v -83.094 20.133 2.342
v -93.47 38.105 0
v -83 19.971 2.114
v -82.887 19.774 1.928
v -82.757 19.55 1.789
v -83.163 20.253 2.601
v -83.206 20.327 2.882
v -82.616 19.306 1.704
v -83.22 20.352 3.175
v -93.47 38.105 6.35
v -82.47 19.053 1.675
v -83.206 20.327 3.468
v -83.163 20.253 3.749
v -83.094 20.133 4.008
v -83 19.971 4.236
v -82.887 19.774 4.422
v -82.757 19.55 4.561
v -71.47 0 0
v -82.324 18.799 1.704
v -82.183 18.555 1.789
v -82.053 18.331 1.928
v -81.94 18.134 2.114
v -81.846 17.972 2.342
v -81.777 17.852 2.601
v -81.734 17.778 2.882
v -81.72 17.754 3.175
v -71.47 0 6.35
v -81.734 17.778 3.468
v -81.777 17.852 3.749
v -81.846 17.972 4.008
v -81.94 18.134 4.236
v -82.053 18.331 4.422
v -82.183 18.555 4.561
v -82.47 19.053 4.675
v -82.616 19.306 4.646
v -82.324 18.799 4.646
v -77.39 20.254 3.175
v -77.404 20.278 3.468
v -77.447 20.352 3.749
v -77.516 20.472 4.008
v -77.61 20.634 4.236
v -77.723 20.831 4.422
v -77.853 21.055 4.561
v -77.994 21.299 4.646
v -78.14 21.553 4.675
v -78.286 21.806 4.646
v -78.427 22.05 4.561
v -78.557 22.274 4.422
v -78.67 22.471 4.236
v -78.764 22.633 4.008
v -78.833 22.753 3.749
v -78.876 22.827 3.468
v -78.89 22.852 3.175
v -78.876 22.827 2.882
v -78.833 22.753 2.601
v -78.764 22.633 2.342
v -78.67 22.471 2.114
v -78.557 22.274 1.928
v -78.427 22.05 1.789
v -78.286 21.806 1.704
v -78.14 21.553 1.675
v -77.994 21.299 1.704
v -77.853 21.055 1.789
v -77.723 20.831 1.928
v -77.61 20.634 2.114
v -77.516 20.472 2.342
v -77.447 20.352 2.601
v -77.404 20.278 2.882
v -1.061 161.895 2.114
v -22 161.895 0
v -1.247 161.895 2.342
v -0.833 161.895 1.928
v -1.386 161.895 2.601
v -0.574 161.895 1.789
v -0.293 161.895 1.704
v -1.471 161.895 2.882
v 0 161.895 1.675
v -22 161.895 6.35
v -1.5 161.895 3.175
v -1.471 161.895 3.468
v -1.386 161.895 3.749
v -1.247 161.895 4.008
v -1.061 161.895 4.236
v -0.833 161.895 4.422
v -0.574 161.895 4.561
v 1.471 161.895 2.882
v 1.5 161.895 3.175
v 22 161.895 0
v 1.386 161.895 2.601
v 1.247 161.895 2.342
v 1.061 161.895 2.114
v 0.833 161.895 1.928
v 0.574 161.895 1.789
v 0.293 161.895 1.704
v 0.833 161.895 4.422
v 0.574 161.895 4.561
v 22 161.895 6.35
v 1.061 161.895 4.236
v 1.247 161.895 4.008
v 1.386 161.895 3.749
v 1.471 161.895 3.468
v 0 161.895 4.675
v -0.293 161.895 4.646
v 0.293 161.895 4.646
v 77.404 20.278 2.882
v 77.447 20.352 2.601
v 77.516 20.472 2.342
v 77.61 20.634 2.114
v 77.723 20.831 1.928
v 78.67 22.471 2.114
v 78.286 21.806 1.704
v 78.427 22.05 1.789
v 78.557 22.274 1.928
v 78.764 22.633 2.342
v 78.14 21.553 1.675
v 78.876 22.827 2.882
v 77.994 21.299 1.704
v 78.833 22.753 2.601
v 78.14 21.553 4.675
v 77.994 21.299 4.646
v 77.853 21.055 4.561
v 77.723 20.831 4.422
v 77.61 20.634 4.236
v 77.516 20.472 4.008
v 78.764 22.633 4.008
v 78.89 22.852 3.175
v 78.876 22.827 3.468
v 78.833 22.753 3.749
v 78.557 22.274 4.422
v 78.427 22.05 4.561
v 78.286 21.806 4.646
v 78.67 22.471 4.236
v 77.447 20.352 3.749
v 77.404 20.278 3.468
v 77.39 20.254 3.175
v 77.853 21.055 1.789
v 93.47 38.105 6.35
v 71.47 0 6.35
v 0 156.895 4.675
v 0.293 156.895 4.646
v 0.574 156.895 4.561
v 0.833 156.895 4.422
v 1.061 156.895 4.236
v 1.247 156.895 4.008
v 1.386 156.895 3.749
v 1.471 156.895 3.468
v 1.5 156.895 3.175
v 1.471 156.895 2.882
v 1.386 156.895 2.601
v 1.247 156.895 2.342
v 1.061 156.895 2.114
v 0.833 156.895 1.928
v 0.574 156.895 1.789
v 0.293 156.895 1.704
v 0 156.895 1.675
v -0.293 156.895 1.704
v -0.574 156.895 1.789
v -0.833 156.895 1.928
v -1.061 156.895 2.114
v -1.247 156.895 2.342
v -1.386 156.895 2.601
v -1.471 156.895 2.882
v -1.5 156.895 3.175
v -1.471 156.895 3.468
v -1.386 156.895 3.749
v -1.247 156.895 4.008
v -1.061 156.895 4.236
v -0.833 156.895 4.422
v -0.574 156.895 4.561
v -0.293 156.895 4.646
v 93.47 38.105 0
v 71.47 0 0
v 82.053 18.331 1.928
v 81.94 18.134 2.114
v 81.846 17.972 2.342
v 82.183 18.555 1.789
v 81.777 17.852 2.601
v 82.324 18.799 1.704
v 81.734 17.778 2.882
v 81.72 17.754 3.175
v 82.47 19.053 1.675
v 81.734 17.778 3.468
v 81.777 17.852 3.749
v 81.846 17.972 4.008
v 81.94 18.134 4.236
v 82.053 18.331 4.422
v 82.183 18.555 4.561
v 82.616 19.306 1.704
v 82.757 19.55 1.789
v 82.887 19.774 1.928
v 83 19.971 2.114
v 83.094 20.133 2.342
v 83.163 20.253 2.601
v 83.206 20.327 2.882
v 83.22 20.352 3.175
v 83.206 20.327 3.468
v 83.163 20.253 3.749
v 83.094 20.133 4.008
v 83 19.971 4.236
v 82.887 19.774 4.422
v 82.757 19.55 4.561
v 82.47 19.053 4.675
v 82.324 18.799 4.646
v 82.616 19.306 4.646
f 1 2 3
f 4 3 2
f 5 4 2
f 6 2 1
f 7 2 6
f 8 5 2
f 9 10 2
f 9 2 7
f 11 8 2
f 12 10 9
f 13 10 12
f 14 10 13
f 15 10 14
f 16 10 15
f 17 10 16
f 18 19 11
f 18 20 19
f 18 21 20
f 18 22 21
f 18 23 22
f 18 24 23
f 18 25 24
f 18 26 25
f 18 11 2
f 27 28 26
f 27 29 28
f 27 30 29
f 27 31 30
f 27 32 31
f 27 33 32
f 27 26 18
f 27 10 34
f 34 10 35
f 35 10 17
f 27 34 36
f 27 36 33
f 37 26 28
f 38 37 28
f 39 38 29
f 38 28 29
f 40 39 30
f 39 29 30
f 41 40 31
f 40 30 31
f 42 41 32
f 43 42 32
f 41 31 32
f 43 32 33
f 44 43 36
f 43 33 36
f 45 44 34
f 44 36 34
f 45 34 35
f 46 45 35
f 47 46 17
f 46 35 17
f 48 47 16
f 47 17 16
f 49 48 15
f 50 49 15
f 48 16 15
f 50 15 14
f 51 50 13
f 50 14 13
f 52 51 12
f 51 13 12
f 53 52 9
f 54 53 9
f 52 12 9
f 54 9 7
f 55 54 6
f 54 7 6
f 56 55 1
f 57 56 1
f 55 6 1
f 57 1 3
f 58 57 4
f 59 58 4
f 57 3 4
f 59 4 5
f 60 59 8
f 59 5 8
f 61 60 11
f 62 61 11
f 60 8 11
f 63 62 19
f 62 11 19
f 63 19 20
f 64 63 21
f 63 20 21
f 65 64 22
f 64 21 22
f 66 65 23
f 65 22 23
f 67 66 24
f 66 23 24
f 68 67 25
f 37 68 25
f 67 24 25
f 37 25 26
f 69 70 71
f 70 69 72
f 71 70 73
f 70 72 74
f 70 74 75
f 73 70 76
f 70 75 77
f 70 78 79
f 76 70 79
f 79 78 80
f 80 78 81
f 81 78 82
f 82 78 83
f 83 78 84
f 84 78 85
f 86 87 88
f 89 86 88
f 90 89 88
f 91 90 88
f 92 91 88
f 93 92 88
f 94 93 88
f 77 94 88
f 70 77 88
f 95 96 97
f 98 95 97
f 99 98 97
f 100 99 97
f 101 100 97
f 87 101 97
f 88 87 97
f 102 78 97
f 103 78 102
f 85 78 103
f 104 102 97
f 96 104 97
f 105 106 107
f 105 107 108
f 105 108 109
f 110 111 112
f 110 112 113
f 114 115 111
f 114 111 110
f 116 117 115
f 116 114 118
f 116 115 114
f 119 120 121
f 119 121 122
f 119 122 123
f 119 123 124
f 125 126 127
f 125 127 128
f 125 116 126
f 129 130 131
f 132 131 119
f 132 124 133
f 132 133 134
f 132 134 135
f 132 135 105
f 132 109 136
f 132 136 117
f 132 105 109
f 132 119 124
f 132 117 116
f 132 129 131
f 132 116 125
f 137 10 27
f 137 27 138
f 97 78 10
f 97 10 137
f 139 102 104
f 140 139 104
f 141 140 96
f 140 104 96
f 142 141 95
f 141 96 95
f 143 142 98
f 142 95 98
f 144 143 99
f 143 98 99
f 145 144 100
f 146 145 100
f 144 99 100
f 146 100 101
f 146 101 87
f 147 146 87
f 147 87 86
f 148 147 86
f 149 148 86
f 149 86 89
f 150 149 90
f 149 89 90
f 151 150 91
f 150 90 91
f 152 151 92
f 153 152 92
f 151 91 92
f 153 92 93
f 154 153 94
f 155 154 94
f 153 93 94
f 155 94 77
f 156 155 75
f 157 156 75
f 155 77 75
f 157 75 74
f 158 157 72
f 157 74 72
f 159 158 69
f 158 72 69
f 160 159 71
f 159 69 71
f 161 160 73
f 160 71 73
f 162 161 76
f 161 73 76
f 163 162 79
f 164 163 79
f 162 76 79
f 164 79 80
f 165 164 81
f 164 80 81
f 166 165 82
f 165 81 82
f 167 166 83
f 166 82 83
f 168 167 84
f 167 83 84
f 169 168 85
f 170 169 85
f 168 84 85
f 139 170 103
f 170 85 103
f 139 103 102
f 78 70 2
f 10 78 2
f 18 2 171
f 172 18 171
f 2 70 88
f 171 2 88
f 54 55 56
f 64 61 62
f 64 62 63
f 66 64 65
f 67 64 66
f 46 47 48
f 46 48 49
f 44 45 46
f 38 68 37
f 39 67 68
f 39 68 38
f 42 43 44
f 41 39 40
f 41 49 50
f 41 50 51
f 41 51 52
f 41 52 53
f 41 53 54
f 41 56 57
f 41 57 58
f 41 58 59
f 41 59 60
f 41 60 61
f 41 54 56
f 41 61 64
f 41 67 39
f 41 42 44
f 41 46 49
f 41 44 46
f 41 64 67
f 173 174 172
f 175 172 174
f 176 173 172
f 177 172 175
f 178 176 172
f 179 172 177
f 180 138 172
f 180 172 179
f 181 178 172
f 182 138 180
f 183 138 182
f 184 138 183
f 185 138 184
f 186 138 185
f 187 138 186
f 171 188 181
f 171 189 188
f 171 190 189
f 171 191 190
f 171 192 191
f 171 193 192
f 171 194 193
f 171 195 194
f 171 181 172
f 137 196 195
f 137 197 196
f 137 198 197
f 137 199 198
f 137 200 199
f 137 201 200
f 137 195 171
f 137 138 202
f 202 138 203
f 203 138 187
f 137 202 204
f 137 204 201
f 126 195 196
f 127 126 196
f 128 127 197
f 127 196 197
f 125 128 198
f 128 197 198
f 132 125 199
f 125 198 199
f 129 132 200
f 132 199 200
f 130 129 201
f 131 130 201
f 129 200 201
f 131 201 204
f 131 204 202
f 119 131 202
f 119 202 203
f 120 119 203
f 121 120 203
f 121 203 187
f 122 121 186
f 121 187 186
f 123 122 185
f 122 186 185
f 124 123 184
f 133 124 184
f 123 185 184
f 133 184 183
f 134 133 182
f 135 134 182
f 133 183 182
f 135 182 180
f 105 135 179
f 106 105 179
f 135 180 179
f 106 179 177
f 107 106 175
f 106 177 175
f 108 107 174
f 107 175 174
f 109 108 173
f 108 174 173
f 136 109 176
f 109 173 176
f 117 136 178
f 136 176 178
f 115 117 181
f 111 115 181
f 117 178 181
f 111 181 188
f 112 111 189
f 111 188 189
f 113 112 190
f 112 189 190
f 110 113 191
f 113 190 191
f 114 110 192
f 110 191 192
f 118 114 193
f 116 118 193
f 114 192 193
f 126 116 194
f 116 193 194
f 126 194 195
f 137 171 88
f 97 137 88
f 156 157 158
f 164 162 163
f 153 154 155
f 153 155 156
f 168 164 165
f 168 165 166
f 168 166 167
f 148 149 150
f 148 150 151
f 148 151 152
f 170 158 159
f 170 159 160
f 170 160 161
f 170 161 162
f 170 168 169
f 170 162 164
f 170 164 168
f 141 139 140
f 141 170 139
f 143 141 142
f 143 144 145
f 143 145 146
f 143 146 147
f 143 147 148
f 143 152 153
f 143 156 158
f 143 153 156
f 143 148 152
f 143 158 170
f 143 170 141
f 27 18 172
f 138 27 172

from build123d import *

# Parameters (mm, degrees)
BOSS_EXTRU_1_DEPTH      = 6.35
ENL_V_MAT_EXTRU_2_DEPTH = 232.027391955
ESQUISSE5_R             = 1.5
ENL_V_MAT_EXTRU_3_DEPTH = 5
ESQUISSE7_R             = 1.5
ENL_V_MAT_EXTRU_4_DEPTH = 5
ESQUISSE8_R             = 1.5
ENL_V_MAT_EXTRU_5_DEPTH = 5


with BuildPart() as part:
    # Esquisse2 → Boss.-Extru.1 (new body)
    with BuildSketch(Plane.XY):
        Polygon((-115.470053838, 0), (115.470053838, 0), (0, 200), align=None)
    extrude(amount=BOSS_EXTRU_1_DEPTH)

    # Esquisse4 → Enlèv. mat.-Extru.2 (cut, through all)
    with BuildSketch(Plane.XY.offset(6.35)):
        Polygon((-115.470053838, 0), (-93.470053838, 38.105117767), (-71.470053838, 0), align=None)
        Polygon((115.470053838, 0), (71.470053838, 0), (93.470053838, 38.105117767), align=None)
        Polygon((0, 200), (-22, 161.894882233), (22, 161.894882233), align=None)
    extrude(amount=-ENL_V_MAT_EXTRU_2_DEPTH, mode=Mode.SUBTRACT)

    # Esquisse5 → Enlèv. mat.-Extru.3 (cut)
    with BuildSketch(Plane(origin=(-53.602540378, -30.947441117, 0), x_dir=(0, 0, 1), z_dir=(-0.8660254037844389, -0.49999999999999983, 0))):
        with Locations(Location((3.175, 57.735026919, 0), (0, 0, 270))):
            Circle(ESQUISSE5_R)
    extrude(amount=-ENL_V_MAT_EXTRU_3_DEPTH, mode=Mode.SUBTRACT)

    # Esquisse7 → Enlèv. mat.-Extru.4 (cut)
    with BuildSketch(Plane(origin=(0, 161.894882233, 0), x_dir=(1, 0, 0), z_dir=(0, 1, 0))):
        with Locations(Location((0, -3.175, 0), (0, 0, 270))):
            Circle(ESQUISSE7_R)
    extrude(amount=-ENL_V_MAT_EXTRU_4_DEPTH, mode=Mode.SUBTRACT)

    # Esquisse8 → Enlèv. mat.-Extru.5 (cut)
    with BuildSketch(Plane(origin=(53.602540378, -30.947441117, 0), x_dir=(0, 0, -1), z_dir=(0.8660254037844383, -0.5000000000000009, 0))):
        with Locations(Location((-3.175, 57.735026919, 0), (0, 0, 90))):
            Circle(ESQUISSE8_R)
    extrude(amount=-ENL_V_MAT_EXTRU_5_DEPTH, mode=Mode.SUBTRACT)


solid = part.part
